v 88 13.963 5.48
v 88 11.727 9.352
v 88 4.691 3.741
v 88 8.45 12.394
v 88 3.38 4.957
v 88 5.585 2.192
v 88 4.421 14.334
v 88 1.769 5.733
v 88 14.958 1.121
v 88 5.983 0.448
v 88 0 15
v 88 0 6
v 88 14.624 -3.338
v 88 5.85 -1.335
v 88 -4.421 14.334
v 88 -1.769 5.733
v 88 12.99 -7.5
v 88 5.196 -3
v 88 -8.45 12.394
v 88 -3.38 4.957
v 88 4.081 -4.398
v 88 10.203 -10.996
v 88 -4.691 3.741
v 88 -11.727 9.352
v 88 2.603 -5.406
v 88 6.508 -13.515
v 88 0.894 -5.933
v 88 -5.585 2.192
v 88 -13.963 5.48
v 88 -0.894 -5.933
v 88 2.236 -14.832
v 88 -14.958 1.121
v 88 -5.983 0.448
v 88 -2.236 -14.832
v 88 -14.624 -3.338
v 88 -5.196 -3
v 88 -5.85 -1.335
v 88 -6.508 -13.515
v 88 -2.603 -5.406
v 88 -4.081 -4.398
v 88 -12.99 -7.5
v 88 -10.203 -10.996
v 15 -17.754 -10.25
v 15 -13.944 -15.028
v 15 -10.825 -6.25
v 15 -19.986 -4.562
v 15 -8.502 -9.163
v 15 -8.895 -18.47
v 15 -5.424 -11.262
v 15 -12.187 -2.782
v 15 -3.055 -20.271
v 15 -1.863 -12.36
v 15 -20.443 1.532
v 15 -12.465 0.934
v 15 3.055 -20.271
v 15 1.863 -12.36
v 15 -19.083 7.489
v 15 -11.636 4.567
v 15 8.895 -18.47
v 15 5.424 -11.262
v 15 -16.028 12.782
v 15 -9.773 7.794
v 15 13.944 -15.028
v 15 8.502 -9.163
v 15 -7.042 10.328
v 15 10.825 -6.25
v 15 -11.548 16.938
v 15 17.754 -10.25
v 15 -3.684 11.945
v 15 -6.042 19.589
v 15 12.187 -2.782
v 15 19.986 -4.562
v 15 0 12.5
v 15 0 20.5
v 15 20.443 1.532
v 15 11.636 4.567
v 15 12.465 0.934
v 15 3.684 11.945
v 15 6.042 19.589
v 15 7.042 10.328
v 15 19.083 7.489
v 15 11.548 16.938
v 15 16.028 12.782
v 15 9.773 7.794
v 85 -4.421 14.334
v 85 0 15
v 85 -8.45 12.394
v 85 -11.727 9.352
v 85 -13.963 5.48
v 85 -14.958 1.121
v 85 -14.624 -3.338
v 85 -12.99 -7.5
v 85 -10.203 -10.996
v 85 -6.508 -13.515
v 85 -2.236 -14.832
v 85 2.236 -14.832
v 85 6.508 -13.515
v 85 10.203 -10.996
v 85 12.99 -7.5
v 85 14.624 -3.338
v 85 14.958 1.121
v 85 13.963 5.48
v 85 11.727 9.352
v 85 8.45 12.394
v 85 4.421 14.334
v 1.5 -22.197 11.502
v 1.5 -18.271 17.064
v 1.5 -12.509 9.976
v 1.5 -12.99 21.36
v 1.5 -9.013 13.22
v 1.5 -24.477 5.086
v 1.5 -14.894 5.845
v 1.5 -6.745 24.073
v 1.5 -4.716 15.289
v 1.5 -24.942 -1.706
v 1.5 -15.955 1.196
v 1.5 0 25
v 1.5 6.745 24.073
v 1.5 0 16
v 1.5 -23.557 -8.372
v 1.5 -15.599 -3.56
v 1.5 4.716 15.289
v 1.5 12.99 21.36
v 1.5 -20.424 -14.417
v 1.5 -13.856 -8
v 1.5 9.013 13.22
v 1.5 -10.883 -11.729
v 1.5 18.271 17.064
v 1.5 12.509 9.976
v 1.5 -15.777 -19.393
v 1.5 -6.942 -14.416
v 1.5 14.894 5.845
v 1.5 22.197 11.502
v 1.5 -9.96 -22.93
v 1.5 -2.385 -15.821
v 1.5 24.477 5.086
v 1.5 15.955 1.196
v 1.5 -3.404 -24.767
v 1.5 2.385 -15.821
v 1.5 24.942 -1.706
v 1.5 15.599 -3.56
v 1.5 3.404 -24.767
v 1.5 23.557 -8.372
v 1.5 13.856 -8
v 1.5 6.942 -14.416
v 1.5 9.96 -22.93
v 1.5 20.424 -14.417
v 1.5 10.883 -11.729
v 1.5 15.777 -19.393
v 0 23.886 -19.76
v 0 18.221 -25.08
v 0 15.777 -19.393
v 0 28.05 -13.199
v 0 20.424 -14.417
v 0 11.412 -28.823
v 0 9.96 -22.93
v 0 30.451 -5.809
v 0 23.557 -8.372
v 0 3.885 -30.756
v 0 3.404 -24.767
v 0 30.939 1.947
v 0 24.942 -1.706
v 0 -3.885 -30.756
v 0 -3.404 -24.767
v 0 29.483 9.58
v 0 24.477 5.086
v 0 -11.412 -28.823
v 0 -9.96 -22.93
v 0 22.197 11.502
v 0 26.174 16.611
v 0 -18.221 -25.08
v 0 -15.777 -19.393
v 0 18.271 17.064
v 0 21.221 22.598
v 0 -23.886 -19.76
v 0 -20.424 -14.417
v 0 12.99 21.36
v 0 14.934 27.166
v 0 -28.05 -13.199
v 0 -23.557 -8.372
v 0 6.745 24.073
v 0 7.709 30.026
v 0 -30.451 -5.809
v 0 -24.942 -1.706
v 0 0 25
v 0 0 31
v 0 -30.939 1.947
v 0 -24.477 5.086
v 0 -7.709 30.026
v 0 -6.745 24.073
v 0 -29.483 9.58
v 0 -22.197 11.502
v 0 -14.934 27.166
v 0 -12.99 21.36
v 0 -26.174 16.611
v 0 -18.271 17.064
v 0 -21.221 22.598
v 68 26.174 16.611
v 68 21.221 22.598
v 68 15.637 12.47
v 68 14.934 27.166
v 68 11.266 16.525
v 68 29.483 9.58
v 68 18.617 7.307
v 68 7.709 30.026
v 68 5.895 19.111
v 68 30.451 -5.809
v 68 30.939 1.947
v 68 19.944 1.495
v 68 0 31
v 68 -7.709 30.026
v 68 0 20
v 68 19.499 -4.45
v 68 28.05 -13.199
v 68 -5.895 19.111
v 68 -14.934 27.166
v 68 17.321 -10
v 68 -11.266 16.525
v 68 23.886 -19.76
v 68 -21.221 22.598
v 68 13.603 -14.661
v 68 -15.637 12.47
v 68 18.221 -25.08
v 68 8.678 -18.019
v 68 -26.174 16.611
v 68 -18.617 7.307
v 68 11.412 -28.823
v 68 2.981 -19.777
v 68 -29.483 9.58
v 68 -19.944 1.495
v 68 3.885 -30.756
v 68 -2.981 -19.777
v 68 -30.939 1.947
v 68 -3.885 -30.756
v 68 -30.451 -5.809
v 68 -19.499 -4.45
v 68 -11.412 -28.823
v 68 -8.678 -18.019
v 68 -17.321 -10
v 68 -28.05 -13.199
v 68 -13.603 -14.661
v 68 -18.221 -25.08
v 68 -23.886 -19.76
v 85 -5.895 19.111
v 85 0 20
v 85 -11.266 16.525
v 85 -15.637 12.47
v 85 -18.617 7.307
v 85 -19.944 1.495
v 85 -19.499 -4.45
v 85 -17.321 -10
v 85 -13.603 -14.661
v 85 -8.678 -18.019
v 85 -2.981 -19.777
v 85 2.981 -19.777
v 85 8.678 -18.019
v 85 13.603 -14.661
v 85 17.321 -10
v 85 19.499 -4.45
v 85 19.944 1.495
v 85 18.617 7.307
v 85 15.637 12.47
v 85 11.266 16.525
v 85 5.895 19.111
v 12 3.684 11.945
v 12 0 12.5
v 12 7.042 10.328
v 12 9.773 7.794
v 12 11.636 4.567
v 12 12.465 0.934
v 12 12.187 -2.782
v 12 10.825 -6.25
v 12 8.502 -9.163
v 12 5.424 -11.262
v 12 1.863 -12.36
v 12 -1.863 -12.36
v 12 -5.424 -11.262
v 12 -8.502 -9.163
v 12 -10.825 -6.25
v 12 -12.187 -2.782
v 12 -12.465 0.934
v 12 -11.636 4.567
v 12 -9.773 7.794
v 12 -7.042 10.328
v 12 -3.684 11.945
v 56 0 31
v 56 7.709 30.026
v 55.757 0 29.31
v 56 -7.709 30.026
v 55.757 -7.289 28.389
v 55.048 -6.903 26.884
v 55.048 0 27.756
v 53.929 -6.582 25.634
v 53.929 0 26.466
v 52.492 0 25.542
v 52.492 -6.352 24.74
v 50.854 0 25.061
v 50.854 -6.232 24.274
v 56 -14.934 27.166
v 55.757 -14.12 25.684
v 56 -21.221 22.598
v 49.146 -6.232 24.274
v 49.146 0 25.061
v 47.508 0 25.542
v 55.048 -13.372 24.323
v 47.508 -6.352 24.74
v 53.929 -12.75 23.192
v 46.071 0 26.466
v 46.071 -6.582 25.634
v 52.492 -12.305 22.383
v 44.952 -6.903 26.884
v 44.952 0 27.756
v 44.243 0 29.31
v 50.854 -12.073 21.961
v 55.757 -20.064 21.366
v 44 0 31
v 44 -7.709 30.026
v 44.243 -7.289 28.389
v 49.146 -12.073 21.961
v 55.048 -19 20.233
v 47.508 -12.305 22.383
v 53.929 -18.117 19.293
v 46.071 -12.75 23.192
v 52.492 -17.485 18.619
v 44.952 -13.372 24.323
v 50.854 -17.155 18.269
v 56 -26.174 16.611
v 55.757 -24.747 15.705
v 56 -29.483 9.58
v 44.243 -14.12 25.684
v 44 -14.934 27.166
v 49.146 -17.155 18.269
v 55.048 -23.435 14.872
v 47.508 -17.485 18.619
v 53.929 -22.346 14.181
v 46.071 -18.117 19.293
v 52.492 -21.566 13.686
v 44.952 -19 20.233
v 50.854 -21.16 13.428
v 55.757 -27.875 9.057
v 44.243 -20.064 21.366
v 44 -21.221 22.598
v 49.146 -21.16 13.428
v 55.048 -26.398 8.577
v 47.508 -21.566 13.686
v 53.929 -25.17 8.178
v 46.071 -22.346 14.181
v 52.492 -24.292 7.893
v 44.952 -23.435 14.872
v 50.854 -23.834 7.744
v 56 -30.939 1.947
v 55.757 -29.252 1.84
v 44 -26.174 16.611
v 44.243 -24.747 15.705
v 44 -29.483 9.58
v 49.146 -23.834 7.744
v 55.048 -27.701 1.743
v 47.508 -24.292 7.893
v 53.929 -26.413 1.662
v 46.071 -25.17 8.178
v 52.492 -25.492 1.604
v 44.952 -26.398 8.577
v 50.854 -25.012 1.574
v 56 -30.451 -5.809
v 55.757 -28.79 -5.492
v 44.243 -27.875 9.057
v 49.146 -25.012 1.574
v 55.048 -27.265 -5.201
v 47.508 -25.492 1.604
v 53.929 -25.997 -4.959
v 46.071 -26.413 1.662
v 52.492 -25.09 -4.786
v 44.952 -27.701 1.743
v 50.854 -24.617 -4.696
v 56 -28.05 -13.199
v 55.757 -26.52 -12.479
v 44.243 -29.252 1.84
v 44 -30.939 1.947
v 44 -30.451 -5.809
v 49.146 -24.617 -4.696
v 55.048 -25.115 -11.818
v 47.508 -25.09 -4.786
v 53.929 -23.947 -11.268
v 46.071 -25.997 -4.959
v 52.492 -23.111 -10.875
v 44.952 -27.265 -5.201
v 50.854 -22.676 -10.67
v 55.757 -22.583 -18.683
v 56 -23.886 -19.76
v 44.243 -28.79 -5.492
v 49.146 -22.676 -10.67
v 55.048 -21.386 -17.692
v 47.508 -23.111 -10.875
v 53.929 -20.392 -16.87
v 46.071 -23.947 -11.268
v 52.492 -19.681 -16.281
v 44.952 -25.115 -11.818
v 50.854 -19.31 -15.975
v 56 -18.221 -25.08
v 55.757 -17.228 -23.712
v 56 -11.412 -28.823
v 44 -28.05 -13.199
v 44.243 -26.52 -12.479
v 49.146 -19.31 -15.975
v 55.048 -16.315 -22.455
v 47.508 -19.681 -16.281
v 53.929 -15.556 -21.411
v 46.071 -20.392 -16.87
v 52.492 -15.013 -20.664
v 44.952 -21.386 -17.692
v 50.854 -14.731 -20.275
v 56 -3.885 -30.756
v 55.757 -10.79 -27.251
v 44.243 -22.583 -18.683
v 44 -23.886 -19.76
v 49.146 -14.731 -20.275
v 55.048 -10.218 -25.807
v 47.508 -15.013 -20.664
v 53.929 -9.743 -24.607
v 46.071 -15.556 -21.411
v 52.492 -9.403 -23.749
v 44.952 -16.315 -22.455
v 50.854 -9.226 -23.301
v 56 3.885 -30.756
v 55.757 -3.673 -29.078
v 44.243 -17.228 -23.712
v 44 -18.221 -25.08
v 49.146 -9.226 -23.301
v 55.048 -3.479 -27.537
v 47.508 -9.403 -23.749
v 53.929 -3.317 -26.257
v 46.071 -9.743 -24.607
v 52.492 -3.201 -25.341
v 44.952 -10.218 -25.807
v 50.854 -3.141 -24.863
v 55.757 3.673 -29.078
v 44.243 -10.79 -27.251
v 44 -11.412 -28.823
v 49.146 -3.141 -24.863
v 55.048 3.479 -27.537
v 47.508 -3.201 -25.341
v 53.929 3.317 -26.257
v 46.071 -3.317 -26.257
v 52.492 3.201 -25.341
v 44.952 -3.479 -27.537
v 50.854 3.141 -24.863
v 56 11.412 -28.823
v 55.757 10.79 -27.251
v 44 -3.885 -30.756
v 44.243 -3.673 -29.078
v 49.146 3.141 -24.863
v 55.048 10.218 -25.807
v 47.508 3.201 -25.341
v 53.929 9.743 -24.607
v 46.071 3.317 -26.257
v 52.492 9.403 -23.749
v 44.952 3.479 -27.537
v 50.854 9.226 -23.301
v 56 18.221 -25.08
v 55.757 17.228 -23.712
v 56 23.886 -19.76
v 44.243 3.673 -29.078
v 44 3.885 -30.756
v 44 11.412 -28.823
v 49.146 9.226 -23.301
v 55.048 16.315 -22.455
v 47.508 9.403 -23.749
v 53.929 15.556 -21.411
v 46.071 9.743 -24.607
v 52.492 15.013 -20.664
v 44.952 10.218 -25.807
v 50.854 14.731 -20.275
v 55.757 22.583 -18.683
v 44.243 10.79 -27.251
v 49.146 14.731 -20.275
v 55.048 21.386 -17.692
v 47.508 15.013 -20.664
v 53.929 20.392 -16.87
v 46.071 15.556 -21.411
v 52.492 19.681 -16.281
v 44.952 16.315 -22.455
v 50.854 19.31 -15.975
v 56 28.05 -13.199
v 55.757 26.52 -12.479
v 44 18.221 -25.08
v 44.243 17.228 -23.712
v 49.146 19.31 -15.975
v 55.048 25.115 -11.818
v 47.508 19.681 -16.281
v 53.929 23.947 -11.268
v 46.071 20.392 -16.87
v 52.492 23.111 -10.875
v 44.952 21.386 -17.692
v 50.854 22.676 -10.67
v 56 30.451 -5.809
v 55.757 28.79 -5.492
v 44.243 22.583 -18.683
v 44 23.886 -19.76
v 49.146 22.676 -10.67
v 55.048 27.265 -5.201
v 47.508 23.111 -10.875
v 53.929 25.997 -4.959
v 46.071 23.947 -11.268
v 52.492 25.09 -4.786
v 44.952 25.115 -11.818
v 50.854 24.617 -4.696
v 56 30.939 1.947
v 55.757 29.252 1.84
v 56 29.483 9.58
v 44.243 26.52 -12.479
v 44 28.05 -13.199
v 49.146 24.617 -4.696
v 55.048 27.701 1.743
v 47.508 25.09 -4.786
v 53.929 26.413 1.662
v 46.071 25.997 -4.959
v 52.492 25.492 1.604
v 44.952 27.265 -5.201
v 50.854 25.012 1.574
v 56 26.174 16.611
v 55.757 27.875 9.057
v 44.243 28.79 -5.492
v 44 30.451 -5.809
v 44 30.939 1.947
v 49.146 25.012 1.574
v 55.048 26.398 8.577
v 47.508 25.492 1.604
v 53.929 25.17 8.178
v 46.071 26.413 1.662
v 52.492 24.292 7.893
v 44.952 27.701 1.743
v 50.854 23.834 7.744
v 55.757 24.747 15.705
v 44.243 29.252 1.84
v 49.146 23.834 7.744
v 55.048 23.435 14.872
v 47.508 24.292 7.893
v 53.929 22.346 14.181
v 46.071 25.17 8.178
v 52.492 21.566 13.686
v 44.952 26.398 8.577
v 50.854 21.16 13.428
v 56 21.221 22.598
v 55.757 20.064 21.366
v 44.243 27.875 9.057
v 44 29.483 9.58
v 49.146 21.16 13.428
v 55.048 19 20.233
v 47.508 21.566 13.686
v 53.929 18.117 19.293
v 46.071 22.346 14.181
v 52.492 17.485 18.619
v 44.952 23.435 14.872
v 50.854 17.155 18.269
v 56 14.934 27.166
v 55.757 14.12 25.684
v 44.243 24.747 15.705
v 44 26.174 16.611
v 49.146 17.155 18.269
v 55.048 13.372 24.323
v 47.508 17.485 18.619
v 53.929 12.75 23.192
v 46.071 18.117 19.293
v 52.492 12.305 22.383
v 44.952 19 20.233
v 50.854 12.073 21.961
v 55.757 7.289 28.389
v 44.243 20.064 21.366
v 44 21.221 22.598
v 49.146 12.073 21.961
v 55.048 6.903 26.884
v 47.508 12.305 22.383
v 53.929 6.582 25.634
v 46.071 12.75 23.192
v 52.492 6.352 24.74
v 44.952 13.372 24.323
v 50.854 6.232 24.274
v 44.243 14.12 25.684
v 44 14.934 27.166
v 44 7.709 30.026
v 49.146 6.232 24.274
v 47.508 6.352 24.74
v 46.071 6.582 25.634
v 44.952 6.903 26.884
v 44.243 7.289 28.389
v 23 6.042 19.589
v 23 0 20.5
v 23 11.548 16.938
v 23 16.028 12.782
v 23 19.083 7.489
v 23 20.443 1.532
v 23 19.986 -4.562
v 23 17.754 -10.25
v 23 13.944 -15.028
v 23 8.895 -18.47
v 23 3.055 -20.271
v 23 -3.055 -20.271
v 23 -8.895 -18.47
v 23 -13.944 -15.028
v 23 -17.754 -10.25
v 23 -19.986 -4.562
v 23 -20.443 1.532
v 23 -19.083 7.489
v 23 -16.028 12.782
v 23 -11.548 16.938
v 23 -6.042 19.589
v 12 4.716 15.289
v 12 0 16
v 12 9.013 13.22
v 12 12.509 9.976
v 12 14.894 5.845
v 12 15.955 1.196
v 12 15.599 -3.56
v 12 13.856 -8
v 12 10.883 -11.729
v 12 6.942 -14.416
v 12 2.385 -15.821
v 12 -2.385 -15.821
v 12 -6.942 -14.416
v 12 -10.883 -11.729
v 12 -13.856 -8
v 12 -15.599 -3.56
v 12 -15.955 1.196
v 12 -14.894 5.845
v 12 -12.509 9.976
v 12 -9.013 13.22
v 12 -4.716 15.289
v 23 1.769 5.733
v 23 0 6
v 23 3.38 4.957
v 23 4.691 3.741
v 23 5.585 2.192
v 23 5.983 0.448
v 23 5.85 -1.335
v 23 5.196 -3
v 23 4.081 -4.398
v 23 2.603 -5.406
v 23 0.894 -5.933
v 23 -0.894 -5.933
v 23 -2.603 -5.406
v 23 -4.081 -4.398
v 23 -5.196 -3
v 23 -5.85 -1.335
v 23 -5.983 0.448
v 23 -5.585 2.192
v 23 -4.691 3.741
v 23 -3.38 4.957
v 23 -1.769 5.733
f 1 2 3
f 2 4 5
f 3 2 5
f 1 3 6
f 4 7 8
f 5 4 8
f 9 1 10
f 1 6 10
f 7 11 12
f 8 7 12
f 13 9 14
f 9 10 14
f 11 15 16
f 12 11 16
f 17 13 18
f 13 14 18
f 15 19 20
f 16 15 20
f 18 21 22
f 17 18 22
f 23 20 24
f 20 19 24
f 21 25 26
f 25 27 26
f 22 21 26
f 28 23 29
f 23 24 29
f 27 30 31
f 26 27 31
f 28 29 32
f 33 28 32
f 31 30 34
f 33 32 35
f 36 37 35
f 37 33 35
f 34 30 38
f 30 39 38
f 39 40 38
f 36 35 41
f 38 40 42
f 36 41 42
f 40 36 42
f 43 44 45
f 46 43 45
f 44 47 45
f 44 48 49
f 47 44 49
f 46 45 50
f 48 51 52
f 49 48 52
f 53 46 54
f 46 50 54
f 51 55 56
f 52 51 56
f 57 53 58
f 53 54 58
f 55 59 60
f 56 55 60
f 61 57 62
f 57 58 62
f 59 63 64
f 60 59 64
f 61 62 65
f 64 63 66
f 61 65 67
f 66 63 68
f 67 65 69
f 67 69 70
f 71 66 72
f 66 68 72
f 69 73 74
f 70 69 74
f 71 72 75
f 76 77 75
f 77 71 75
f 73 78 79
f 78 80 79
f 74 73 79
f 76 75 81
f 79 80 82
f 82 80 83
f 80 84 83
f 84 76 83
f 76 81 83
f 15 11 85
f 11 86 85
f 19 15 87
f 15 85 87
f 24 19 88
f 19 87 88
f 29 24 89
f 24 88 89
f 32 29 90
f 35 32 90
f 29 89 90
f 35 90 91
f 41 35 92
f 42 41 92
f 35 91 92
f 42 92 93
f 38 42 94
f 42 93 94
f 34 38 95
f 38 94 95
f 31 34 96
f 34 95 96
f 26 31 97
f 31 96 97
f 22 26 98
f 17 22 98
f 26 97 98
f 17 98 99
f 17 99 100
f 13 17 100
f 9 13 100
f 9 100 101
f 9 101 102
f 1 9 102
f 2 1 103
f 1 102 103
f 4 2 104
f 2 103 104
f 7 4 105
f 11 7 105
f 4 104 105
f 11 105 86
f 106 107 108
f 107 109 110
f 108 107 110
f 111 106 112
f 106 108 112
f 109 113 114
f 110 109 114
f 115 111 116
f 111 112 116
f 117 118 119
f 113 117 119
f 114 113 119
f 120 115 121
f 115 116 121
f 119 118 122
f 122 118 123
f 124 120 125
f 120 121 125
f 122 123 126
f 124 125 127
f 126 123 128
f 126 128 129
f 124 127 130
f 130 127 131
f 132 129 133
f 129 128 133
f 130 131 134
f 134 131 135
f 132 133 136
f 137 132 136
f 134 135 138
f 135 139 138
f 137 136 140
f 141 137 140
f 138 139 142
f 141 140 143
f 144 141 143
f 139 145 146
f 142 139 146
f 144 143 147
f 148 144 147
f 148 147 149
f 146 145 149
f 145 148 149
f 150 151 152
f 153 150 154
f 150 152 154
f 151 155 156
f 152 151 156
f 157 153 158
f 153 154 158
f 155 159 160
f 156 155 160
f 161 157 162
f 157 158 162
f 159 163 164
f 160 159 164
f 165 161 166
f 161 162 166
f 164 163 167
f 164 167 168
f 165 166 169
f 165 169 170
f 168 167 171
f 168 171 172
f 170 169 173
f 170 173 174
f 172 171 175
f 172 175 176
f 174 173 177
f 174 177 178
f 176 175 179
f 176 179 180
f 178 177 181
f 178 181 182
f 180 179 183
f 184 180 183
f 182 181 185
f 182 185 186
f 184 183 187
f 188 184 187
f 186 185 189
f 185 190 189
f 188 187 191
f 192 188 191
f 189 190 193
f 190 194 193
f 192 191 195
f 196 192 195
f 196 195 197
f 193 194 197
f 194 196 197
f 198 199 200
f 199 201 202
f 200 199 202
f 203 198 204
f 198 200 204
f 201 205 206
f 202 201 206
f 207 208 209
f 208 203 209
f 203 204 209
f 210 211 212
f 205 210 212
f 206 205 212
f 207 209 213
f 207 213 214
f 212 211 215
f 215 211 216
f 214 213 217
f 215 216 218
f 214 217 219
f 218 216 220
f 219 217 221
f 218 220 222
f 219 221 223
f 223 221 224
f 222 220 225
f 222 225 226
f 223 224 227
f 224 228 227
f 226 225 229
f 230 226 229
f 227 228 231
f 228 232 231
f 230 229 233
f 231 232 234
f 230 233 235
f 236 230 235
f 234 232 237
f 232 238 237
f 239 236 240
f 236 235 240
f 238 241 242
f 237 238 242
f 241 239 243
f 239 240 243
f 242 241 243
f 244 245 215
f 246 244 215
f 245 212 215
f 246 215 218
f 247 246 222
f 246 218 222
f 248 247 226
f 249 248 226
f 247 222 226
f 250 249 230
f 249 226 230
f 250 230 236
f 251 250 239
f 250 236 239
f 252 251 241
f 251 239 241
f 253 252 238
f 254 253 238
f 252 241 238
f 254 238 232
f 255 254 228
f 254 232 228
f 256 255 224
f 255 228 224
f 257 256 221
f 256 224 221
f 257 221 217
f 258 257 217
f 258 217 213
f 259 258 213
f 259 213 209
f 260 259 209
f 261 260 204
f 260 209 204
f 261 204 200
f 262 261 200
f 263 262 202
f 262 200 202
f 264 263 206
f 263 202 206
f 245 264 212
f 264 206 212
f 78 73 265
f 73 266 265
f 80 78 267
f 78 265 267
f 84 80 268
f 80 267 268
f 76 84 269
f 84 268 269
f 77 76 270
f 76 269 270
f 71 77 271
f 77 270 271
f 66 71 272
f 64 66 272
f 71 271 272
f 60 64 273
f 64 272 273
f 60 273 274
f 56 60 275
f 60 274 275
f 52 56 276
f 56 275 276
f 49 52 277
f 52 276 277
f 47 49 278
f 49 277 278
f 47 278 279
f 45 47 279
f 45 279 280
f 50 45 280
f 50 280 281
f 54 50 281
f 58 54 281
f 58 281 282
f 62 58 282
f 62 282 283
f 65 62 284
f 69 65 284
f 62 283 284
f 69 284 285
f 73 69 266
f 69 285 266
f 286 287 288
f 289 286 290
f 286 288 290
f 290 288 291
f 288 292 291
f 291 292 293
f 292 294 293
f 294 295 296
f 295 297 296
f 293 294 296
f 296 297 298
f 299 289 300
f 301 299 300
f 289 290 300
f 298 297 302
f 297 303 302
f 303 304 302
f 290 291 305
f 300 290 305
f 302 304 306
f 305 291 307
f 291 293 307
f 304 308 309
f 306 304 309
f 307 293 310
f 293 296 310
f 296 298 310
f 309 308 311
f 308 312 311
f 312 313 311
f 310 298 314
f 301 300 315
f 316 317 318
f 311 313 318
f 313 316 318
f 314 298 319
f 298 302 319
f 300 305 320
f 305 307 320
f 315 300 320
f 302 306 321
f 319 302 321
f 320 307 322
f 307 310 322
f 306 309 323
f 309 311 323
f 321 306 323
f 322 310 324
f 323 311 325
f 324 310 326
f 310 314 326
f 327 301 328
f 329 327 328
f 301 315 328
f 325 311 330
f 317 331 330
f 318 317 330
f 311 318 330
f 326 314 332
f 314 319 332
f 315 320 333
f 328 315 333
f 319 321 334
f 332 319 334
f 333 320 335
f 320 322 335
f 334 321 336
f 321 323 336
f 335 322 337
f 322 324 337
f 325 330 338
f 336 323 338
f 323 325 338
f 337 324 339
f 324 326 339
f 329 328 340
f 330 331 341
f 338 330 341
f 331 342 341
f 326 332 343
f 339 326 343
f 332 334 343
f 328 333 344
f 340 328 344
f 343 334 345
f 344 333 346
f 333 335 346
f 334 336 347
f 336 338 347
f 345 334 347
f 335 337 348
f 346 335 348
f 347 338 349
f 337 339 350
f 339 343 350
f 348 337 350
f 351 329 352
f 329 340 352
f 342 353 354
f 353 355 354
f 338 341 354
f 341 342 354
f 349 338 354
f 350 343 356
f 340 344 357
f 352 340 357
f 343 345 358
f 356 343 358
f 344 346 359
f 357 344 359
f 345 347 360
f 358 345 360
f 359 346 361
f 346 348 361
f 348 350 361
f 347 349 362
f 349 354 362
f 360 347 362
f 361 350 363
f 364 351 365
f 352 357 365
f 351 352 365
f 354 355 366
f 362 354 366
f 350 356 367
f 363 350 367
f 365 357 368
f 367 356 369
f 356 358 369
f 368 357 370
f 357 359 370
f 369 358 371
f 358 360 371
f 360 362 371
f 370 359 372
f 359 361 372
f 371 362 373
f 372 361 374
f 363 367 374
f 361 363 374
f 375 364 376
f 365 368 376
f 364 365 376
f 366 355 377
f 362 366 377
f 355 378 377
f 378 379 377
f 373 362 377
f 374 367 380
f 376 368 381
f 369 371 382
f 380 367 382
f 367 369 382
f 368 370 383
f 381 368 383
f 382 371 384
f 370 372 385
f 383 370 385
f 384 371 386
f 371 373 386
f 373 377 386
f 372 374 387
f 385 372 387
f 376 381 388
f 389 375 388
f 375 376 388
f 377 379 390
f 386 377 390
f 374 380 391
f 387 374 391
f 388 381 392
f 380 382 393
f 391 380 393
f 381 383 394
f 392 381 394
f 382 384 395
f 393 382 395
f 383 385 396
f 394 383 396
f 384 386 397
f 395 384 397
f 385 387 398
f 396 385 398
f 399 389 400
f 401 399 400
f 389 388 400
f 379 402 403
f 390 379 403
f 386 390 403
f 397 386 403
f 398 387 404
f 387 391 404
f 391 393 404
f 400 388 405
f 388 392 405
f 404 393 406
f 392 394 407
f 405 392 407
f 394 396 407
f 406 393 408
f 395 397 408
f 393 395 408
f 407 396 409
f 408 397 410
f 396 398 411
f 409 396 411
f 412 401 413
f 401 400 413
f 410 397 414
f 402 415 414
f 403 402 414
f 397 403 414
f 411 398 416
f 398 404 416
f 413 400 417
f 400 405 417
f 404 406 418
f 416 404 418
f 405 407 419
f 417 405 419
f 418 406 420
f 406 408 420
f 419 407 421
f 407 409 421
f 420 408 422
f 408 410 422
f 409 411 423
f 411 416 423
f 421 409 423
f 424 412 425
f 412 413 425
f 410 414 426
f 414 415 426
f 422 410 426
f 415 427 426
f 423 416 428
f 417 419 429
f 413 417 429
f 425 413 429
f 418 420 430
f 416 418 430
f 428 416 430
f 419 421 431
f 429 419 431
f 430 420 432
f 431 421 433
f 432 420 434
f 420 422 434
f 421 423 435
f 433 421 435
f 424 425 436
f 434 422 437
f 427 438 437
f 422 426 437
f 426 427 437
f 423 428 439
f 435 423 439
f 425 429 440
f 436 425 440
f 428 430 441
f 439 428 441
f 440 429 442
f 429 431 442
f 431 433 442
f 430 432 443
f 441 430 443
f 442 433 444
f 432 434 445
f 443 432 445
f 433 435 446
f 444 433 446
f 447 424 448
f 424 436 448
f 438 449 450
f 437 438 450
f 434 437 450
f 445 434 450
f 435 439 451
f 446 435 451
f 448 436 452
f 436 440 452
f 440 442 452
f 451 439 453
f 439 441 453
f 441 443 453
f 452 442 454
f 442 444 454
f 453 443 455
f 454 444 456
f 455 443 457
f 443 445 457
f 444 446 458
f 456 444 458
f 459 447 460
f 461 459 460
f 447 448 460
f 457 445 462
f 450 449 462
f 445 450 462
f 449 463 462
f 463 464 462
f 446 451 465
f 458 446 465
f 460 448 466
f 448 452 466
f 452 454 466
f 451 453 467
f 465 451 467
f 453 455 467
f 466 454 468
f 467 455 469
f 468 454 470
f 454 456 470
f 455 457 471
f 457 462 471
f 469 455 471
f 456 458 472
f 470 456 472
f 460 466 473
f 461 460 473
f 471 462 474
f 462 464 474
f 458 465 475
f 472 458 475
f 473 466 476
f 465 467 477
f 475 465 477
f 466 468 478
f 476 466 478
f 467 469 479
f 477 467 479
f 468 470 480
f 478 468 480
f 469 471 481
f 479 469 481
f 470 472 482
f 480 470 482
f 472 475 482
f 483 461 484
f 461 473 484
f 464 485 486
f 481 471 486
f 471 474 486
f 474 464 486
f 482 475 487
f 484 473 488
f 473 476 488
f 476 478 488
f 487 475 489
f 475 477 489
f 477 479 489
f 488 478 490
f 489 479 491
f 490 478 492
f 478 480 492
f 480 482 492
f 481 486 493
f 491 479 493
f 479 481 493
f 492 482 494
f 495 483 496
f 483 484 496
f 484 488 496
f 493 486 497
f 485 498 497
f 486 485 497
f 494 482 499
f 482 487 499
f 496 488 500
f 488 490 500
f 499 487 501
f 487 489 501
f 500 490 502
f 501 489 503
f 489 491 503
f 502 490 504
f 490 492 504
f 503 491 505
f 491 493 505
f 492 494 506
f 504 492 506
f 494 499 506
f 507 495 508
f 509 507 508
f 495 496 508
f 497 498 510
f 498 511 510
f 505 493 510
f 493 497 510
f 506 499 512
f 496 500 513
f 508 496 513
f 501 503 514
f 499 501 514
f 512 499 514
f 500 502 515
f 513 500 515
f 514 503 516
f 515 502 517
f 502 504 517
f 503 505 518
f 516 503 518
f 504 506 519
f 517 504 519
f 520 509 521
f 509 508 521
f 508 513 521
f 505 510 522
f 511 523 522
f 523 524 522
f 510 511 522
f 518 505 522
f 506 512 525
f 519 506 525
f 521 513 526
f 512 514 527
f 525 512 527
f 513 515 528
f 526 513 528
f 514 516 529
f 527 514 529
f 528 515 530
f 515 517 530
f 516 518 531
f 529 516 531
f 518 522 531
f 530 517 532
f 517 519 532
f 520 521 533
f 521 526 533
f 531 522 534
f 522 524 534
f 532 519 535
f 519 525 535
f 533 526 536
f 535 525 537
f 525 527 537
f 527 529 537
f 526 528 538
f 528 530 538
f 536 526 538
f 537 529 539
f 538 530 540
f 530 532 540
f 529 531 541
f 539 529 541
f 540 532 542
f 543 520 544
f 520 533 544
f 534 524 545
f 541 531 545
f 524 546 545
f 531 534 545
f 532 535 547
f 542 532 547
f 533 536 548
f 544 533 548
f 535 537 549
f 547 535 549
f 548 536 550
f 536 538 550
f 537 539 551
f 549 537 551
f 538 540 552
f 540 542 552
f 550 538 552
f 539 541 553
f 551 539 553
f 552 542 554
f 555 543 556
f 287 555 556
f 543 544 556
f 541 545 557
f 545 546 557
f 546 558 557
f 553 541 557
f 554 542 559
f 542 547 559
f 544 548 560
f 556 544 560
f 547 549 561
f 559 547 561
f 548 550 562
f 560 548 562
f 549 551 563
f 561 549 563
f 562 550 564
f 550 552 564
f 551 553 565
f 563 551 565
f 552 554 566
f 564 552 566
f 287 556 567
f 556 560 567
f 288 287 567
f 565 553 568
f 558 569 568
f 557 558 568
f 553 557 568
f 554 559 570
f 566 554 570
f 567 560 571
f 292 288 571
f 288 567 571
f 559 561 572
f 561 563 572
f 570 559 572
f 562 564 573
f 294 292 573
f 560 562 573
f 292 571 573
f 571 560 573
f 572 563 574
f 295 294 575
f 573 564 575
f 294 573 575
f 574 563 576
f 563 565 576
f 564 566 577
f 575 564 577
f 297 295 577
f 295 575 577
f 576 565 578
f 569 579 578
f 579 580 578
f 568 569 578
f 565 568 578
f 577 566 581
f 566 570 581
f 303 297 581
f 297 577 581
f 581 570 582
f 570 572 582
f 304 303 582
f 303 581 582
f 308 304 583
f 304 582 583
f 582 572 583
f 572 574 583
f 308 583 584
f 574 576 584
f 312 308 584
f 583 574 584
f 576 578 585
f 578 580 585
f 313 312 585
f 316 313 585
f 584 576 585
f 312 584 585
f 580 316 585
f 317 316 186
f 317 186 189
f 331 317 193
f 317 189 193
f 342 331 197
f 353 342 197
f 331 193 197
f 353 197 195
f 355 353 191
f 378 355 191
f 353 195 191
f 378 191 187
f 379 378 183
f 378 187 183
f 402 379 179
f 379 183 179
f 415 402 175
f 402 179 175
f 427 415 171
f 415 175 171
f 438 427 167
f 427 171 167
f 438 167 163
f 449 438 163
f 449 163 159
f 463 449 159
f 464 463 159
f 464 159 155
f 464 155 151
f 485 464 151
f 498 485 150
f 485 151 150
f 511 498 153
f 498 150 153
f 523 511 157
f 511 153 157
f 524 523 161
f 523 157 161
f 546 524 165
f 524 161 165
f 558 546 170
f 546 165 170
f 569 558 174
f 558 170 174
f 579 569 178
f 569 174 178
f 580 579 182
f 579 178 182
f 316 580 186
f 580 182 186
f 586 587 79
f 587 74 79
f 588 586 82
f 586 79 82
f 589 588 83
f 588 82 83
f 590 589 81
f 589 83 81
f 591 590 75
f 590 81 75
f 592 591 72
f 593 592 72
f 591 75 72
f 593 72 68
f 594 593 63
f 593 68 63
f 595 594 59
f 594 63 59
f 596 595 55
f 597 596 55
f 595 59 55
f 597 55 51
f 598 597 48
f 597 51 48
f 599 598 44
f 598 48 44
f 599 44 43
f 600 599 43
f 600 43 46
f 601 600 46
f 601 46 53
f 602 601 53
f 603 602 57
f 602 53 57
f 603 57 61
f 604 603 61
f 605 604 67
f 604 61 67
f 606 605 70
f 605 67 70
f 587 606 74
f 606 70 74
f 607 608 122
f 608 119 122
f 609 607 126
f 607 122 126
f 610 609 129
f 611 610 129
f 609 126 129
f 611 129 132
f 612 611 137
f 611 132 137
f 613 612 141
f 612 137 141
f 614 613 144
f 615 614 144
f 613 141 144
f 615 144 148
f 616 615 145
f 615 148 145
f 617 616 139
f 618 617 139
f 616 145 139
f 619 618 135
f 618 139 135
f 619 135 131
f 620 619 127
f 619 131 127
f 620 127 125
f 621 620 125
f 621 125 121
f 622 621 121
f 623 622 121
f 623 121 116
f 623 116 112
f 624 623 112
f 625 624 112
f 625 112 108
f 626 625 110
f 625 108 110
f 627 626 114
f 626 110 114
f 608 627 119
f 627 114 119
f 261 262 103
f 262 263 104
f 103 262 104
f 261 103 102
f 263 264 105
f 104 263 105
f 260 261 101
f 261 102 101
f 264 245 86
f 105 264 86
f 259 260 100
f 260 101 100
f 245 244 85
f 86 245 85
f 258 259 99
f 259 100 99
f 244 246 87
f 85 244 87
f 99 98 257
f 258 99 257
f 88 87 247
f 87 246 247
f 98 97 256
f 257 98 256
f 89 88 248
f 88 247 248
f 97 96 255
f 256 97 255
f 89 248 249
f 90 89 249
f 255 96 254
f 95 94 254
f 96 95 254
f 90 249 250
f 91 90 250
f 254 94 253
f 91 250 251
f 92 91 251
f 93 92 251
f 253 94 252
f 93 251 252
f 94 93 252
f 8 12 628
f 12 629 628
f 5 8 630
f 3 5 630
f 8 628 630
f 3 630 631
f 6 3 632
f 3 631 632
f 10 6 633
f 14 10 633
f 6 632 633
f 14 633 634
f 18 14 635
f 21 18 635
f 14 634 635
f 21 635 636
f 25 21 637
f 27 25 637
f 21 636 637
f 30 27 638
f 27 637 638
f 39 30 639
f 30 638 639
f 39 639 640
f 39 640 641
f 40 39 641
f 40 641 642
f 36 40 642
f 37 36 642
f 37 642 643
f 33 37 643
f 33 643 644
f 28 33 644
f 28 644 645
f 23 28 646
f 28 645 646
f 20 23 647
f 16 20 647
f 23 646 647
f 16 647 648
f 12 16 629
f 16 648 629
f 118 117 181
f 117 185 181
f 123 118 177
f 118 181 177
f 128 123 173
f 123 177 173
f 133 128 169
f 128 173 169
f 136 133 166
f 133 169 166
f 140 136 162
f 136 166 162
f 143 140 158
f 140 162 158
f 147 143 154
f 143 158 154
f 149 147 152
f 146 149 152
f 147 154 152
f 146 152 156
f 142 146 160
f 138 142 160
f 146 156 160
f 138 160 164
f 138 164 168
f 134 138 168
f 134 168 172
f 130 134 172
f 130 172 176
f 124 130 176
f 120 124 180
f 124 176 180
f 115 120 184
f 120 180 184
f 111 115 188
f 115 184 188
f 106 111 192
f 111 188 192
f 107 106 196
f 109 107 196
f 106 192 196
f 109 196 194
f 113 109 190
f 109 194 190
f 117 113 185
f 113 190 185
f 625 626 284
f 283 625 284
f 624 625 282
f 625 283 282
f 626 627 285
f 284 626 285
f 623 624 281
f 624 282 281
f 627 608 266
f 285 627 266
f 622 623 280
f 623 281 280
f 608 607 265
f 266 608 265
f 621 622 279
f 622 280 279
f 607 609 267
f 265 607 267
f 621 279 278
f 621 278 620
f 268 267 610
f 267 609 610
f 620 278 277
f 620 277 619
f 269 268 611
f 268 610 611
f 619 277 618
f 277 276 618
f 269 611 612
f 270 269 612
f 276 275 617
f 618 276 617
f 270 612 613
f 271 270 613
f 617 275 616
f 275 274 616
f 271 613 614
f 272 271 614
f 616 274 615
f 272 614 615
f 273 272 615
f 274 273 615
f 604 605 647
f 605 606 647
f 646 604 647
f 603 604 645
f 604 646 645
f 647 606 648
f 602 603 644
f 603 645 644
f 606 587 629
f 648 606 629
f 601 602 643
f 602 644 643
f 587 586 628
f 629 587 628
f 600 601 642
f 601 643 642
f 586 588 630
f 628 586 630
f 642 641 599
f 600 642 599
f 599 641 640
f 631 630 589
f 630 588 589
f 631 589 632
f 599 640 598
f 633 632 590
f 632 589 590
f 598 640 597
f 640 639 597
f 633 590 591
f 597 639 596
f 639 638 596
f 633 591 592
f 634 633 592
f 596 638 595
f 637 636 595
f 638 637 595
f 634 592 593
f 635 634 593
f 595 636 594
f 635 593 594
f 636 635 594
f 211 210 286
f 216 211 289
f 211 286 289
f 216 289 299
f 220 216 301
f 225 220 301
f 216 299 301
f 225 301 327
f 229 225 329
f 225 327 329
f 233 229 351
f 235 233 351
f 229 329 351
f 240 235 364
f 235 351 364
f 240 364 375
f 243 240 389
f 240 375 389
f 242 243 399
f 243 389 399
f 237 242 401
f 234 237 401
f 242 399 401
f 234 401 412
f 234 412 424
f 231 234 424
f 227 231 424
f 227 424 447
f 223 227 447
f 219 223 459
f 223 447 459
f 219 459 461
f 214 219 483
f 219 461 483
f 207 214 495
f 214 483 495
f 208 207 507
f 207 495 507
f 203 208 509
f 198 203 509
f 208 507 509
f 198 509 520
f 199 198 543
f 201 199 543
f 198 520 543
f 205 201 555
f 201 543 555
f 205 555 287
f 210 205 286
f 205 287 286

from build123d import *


with BuildPart() as f1:
    # F0 (on Front) → F1 (revolve)
    with BuildSketch(Plane.XZ):
        with BuildLine():
            Line((0, 31), (0, 0))
            Line((0, 0), (88, 0))
            Line((88, 0), (88, 15))
            Line((88, 15), (85, 15))
            Line((85, 15), (85, 20))
            Line((85, 20), (68, 20))
            Line((68, 20), (68, 31))
            Line((68, 31), (56, 31))
            ThreePointArc((56, 31), (50, 25), (44, 31))
            Line((44, 31), (0, 31))
        make_face()
    revolve(axis=Axis((113.79065, 0, 0), (1, 0, 0)))

    # F2 (on Front) → F3 (revolve, cut)
    with BuildSketch(Plane.XZ):
        Polygon((0, 25), (0, 0), (93, 0), (93, 6), (23, 6), (23, 20.5), (15, 20.5), (15, 12.5), (12, 12.5), (12, 16), (1.5, 16), (1.5, 25), align=None)
    revolve(axis=Axis((46.5, 0, 0), (-1, 0, 0)), mode=Mode.SUBTRACT)


solid = f1.part
